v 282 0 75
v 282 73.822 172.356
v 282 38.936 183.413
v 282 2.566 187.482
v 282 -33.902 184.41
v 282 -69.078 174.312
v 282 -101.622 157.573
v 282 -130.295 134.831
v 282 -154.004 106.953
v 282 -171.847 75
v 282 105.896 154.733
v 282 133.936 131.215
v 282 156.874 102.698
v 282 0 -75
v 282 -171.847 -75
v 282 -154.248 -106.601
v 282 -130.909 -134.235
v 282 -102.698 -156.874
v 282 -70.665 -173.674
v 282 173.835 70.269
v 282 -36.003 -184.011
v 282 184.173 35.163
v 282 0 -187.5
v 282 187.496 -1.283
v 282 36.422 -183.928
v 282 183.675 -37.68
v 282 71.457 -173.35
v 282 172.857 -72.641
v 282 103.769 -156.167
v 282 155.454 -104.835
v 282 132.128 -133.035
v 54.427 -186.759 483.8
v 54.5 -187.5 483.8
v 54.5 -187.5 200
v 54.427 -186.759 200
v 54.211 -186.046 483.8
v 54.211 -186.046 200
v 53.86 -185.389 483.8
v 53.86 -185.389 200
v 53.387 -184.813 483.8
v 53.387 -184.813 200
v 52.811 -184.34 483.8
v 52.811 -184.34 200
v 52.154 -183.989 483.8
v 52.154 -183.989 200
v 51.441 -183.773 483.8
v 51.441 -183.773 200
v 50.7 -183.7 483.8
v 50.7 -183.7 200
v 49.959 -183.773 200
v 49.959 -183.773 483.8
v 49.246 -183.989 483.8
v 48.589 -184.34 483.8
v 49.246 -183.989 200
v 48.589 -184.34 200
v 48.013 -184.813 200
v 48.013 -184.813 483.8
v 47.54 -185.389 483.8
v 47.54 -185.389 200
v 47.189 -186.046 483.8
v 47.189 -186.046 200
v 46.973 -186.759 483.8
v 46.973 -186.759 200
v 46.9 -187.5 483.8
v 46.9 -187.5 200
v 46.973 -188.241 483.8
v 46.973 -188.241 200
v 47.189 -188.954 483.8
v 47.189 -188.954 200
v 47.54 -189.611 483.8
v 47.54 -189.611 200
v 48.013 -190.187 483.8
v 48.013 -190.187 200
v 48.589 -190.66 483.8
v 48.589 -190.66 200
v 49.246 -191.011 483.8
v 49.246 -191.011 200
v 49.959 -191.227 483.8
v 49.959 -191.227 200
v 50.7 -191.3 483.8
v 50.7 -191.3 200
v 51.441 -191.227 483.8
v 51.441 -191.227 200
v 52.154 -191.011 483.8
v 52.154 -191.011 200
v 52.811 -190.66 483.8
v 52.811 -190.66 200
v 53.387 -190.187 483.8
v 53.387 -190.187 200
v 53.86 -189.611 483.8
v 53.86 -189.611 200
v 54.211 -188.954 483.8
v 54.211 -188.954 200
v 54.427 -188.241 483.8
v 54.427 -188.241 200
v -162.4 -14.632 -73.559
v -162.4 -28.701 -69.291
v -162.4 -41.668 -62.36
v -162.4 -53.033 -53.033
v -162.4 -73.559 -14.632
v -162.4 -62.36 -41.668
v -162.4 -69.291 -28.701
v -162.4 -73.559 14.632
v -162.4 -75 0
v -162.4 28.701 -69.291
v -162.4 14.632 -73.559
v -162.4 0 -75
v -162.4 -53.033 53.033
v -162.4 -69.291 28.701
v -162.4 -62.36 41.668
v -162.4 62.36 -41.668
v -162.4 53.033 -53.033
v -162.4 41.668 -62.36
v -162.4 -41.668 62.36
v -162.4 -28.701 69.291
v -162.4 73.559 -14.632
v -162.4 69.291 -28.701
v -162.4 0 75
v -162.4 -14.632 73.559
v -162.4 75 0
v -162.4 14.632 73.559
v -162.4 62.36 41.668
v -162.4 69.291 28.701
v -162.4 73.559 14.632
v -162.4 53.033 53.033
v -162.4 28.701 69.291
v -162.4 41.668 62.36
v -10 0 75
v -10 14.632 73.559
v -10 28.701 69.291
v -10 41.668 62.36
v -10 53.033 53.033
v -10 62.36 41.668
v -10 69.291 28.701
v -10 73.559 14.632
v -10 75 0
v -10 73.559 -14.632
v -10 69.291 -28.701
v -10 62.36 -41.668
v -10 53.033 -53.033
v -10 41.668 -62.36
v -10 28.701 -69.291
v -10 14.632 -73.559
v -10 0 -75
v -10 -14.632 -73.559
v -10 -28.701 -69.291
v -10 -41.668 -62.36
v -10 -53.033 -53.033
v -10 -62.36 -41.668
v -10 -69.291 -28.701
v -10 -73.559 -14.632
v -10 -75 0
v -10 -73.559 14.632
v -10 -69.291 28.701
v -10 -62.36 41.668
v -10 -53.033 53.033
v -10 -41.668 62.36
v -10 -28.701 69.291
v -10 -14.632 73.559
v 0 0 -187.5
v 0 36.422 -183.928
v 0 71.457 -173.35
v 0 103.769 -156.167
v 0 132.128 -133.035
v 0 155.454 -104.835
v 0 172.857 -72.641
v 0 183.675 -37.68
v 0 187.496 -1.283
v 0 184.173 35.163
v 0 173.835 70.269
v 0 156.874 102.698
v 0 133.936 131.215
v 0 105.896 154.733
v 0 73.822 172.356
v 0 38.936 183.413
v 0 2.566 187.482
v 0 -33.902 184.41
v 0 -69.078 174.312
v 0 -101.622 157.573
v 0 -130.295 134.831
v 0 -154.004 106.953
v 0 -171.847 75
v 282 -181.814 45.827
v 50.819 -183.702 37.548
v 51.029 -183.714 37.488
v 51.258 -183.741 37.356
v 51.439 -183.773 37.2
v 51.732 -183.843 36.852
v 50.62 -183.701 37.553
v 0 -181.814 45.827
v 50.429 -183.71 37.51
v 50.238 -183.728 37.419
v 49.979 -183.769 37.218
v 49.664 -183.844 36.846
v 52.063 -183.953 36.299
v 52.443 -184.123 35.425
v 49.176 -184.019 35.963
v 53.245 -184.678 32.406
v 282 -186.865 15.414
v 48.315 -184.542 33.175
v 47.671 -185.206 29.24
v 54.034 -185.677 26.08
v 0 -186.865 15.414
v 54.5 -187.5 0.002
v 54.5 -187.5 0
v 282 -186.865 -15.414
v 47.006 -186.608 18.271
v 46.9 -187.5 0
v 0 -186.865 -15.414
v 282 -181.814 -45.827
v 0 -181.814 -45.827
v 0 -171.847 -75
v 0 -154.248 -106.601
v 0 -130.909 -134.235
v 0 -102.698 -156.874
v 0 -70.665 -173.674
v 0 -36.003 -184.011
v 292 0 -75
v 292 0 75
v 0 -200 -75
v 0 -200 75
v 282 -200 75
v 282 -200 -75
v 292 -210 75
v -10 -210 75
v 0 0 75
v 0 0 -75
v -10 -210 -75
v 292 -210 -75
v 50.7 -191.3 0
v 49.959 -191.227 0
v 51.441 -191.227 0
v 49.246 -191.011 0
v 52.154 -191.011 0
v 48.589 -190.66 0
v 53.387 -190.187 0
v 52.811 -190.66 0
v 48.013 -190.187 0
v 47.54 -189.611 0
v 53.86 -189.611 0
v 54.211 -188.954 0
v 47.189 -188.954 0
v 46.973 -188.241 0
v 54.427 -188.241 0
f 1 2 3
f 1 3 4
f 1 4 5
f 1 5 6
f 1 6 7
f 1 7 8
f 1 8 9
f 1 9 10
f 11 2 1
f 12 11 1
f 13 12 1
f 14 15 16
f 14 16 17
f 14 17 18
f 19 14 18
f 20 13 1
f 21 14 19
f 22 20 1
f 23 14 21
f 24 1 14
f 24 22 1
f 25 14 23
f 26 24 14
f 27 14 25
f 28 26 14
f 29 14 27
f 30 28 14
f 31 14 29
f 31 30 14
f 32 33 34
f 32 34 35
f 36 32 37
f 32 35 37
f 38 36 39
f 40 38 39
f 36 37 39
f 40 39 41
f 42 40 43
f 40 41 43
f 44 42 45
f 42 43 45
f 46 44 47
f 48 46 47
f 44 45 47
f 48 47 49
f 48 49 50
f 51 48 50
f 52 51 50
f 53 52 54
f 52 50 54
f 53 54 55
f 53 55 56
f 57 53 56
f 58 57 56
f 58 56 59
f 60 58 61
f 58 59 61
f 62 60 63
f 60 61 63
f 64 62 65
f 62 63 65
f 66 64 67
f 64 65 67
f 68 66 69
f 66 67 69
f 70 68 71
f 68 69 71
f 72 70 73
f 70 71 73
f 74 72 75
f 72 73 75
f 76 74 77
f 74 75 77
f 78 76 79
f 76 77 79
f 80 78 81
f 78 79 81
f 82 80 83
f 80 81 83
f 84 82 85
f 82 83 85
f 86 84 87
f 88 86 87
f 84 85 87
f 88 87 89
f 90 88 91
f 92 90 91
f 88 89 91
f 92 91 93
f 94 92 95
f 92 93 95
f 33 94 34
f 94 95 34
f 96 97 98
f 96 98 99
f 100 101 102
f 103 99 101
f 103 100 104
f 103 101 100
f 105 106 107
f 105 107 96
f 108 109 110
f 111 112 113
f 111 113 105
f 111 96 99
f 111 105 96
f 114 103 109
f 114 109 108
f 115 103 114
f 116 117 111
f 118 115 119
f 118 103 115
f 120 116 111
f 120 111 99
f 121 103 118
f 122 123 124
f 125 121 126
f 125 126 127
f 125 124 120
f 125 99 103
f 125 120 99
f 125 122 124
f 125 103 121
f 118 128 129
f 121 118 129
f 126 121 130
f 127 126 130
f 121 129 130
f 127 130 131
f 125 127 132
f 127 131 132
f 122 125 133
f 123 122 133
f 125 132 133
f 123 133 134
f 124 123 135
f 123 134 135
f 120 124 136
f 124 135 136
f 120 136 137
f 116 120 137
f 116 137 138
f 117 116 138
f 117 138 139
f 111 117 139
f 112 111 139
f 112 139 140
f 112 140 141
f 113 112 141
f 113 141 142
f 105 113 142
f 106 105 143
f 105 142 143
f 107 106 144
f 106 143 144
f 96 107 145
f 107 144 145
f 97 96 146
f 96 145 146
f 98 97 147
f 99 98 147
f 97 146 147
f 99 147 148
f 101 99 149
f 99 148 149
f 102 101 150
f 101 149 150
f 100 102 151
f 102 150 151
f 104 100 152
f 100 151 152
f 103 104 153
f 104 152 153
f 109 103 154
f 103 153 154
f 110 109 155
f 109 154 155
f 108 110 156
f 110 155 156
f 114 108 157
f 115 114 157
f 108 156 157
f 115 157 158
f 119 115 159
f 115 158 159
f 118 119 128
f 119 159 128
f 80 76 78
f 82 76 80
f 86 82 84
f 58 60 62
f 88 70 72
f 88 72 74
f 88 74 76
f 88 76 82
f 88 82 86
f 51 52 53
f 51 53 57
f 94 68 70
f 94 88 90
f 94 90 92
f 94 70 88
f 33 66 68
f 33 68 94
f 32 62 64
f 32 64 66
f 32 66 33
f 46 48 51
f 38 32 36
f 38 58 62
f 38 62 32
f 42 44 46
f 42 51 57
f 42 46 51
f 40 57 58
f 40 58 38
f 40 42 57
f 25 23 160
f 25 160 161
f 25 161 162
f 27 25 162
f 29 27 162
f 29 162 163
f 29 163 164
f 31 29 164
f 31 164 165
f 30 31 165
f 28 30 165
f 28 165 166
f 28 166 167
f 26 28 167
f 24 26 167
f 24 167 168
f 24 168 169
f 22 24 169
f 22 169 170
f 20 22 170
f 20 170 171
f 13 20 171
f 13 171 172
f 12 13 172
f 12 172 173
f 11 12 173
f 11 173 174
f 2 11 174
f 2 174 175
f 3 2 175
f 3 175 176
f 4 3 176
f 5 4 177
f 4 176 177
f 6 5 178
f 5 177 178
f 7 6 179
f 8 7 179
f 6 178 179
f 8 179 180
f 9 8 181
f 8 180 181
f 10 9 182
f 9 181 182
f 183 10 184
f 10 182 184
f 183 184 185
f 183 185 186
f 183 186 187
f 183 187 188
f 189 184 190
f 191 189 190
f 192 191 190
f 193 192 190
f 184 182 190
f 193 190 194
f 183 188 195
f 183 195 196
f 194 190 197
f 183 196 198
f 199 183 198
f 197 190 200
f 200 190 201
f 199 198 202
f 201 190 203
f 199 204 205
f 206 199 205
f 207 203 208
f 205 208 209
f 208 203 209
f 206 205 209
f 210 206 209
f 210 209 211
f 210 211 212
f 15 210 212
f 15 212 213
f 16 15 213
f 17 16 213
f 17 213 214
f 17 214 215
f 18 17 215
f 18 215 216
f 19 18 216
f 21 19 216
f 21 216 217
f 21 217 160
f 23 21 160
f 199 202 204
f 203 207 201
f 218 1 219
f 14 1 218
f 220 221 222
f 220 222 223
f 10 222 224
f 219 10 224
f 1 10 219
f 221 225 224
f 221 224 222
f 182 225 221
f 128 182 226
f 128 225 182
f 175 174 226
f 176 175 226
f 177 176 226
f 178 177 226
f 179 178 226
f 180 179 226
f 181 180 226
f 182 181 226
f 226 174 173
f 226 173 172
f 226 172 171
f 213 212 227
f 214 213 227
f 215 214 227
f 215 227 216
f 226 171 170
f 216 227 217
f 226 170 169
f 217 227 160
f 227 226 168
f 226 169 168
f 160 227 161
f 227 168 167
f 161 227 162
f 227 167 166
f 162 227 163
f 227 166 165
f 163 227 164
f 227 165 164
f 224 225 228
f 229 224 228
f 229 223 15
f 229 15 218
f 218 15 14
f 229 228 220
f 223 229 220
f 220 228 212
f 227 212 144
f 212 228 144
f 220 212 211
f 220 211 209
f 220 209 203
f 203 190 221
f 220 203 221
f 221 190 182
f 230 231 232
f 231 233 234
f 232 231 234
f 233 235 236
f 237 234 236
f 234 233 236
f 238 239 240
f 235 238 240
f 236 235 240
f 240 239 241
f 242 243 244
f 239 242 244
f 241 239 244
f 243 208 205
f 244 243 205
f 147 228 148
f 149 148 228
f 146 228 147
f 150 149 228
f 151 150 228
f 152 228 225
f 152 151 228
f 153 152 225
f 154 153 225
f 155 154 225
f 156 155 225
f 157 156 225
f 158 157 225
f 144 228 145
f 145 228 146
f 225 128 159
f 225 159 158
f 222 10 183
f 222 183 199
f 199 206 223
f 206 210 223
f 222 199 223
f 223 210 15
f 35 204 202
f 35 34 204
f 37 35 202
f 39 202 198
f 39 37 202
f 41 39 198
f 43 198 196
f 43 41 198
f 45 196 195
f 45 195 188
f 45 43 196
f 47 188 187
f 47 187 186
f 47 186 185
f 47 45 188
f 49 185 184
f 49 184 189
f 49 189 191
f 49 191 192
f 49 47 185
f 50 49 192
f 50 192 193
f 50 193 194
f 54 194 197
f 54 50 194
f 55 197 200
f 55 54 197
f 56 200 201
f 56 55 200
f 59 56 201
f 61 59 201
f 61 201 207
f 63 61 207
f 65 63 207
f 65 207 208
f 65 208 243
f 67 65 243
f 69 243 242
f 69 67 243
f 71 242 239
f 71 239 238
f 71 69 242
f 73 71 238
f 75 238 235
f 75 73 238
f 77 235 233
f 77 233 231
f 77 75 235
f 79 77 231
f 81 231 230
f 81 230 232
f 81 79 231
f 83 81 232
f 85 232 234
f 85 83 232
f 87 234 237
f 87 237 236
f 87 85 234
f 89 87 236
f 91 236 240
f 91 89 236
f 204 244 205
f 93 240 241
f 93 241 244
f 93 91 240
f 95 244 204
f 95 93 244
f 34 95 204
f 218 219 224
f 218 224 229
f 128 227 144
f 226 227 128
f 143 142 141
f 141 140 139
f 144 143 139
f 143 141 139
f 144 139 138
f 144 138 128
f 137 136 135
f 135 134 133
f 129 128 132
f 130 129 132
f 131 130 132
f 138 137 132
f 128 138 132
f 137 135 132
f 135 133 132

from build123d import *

# Parameters (mm, degrees)
SKETCH1_R           = 187.5
BOSS_EXTRUDE1_DEPTH = 282
SKETCH2_W           = 150
SKETCH2_H           = 210
BOSS_EXTRUDE2_DEPTH = 10
SKETCH3_W           = 150
SKETCH3_H           = 210
BOSS_EXTRUDE3_DEPTH = 10
BOSS_EXTRUDE4_REACH = 294
SKETCH4_W           = 150
SKETCH4_H           = 10
SKETCH5_R           = 75
BOSS_EXTRUDE5_DEPTH = 152.4
SKETCH8_R           = 3.8
SKETCH9_R           = 3.8
BOSS_EXTRUDE6_DEPTH = 283.8


with BuildPart() as part:
    # Sketch1 → Boss-Extrude1 (new body)
    with BuildSketch(Plane(origin=(0, 0, 0), x_dir=(0, 0, -1), z_dir=(1, 0, 0))):
        Circle(SKETCH1_R)
    extrude(amount=BOSS_EXTRUDE1_DEPTH)

    # Sketch2 → Boss-Extrude2 (add)
    with BuildSketch(Plane.ZY):
        with Locations((0, -105)):
            Rectangle(SKETCH2_W, SKETCH2_H)
    extrude(amount=BOSS_EXTRUDE2_DEPTH)

    # Sketch3 → Boss-Extrude3 (add)
    with BuildSketch(Plane(origin=(282, 0, 0), x_dir=(0, 0, -1), z_dir=(1, 0, 0))):
        with Locations((0, -105)):
            Rectangle(SKETCH3_W, SKETCH3_H)
    extrude(amount=BOSS_EXTRUDE3_DEPTH)

    # Sketch4 → Boss-Extrude4 (add, up to next)
    with BuildSketch(Plane(origin=(0, 0, 0), x_dir=(0, 0, -1), z_dir=(1, 0, 0)), mode=Mode.PRIVATE) as boss_extrude4_sk1:
        with Locations((0, -205)):
            Rectangle(SKETCH4_W, SKETCH4_H)
    boss_extrude4_tool1 = extrude(boss_extrude4_sk1.sketch, amount=BOSS_EXTRUDE4_REACH, mode=Mode.PRIVATE) - part.part
    add(boss_extrude4_tool1.solids().sort_by_distance((0, -205, 0))[0])

    # Sketch5 → Boss-Extrude5 (add)
    with BuildSketch(Plane.ZY.offset(10)):
        Circle(SKETCH5_R)
    extrude(amount=BOSS_EXTRUDE5_DEPTH)

    # Sweep2: sweep along a path in Sketch6
    with BuildLine(Plane(origin=(50.7, 0, 0), x_dir=(0, 0, -1), z_dir=(1, 0, 0))) as sweep2_path:
        Line((0, -187.5), (-200, -187.5))
    # Sketch8 → Sweep2 (sweep)
    with BuildSketch(Plane.XY.offset(200)):
        with Locations((50.7, -187.5)):
            Circle(SKETCH8_R)
    sweep(path=sweep2_path.line)

    # Sketch9 → Boss-Extrude6 (add)
    with BuildSketch(Plane.XY.offset(200)):
        with Locations((50.7, -187.5)):
            Circle(SKETCH9_R)
    extrude(amount=BOSS_EXTRUDE6_DEPTH)


solid = part.part
